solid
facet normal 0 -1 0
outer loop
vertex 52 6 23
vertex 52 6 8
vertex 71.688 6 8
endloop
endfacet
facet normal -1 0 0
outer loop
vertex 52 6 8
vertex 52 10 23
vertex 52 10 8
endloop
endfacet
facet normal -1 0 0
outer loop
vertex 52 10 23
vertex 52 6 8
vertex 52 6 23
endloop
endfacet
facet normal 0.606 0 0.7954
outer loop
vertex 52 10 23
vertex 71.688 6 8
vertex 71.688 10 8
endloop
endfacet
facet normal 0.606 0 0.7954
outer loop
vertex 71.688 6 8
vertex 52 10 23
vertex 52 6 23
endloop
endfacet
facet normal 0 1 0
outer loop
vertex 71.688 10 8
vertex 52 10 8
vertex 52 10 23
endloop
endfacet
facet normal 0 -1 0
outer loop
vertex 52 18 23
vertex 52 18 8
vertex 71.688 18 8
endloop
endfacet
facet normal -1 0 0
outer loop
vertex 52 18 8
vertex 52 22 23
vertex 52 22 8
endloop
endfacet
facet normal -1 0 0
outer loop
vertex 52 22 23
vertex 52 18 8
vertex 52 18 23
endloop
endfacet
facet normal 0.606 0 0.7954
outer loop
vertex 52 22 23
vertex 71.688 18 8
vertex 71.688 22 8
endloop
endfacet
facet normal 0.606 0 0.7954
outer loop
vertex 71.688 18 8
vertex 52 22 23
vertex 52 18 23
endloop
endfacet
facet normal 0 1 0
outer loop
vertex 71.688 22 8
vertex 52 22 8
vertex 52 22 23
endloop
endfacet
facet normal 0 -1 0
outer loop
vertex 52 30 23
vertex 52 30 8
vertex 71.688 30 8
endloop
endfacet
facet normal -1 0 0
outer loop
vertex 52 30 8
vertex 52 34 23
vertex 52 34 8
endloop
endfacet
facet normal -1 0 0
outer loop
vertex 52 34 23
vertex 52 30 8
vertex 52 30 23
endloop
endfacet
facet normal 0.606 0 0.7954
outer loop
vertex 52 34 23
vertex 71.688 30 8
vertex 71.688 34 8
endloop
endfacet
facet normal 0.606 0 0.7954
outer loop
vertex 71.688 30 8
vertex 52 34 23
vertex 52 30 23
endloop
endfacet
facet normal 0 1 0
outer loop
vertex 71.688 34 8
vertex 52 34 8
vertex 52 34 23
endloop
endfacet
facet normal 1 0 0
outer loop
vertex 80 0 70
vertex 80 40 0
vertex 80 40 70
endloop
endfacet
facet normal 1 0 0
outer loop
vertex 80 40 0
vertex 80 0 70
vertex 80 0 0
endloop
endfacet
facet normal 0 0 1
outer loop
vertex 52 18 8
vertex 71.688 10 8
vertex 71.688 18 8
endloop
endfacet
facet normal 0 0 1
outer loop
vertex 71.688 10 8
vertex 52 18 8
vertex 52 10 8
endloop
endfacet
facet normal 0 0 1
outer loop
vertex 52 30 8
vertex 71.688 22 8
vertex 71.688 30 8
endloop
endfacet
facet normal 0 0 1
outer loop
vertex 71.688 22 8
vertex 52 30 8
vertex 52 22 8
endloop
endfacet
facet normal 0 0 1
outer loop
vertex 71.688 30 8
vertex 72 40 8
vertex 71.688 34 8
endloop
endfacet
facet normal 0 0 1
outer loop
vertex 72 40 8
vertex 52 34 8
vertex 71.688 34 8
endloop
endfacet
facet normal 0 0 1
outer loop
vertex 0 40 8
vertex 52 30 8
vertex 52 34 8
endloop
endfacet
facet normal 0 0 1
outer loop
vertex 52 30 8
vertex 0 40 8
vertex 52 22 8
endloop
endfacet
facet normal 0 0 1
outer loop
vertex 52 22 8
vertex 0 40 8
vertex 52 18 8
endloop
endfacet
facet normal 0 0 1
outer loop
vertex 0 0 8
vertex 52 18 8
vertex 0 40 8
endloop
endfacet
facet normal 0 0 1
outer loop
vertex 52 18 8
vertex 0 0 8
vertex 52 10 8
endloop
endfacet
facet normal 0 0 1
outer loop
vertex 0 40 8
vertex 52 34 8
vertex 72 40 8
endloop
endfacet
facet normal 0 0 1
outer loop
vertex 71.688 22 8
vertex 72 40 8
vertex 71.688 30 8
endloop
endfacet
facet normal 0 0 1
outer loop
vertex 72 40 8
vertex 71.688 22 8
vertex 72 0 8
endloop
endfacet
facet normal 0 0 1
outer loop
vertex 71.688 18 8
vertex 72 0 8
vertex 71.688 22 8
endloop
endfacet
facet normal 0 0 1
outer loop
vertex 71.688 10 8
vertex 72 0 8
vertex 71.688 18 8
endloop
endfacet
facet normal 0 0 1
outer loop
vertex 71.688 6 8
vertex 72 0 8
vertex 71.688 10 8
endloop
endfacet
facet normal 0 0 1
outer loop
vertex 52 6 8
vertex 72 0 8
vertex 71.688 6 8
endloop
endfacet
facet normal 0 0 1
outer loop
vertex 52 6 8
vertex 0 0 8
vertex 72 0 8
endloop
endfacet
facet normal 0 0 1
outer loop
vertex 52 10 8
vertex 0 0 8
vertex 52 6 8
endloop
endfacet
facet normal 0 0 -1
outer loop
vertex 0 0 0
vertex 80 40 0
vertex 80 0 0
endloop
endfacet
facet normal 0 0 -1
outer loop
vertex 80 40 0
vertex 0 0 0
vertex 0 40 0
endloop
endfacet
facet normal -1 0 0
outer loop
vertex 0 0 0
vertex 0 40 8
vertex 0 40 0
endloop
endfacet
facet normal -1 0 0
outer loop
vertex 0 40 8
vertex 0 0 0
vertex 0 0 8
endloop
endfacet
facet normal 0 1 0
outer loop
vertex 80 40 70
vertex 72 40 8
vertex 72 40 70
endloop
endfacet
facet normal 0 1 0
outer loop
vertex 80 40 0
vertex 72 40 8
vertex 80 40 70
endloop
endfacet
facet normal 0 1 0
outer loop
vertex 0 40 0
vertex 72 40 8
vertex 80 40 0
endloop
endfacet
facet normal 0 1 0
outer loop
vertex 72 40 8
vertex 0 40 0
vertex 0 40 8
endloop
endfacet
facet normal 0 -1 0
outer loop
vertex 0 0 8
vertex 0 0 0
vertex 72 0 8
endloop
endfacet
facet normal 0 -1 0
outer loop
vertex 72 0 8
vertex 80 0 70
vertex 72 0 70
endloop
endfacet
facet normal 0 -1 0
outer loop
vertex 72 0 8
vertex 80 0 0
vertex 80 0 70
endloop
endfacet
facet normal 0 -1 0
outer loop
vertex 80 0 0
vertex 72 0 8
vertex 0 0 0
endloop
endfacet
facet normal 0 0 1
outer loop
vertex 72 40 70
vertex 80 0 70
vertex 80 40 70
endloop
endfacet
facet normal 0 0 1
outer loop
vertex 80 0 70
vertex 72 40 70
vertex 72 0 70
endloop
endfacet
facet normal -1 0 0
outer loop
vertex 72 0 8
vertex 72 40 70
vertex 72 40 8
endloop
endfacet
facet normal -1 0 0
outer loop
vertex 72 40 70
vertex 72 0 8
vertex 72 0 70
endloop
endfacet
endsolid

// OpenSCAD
$fn = 32;

// ----------------------------------------------------------------------
// Rib bracket: 3-gusset L bracket
// ----------------------------------------------------------------------

// --- parameters (mm) ---
base_l = 80;              // foot length, X
base_w = 40;              // foot width, Y
base_t = 8;               // foot thickness
plate_t = 8;              // upright plate thickness
plate_h = 70;             // overall height
gus_l = 20;               // gusset leg along the foot
gus_h = 16;               // gusset height
gus_t = 4;                // gusset thickness
gus_edge = 6;             // gusset margin from the foot edge
n_gus = 3;                // gusset count

gus_pitch = (base_w - 2 * gus_edge - gus_t) / (n_gus - 1);  // gusset pitch

union() {
  cube([base_l, base_w, base_t]);
  translate([base_l - plate_t, 0, base_t - 1])
    cube([plate_t, base_w, plate_h - base_t + 1]);
  for (i = [0 : n_gus - 1])
    translate([base_l - plate_t - gus_l, gus_edge + i * gus_pitch, base_t - 1])
      rotate([-90, 0, 0])
        linear_extrude(height = gus_t)
          polygon(points = [[0, 0], [gus_l + 1, 0], [0, -gus_h]]);
}
